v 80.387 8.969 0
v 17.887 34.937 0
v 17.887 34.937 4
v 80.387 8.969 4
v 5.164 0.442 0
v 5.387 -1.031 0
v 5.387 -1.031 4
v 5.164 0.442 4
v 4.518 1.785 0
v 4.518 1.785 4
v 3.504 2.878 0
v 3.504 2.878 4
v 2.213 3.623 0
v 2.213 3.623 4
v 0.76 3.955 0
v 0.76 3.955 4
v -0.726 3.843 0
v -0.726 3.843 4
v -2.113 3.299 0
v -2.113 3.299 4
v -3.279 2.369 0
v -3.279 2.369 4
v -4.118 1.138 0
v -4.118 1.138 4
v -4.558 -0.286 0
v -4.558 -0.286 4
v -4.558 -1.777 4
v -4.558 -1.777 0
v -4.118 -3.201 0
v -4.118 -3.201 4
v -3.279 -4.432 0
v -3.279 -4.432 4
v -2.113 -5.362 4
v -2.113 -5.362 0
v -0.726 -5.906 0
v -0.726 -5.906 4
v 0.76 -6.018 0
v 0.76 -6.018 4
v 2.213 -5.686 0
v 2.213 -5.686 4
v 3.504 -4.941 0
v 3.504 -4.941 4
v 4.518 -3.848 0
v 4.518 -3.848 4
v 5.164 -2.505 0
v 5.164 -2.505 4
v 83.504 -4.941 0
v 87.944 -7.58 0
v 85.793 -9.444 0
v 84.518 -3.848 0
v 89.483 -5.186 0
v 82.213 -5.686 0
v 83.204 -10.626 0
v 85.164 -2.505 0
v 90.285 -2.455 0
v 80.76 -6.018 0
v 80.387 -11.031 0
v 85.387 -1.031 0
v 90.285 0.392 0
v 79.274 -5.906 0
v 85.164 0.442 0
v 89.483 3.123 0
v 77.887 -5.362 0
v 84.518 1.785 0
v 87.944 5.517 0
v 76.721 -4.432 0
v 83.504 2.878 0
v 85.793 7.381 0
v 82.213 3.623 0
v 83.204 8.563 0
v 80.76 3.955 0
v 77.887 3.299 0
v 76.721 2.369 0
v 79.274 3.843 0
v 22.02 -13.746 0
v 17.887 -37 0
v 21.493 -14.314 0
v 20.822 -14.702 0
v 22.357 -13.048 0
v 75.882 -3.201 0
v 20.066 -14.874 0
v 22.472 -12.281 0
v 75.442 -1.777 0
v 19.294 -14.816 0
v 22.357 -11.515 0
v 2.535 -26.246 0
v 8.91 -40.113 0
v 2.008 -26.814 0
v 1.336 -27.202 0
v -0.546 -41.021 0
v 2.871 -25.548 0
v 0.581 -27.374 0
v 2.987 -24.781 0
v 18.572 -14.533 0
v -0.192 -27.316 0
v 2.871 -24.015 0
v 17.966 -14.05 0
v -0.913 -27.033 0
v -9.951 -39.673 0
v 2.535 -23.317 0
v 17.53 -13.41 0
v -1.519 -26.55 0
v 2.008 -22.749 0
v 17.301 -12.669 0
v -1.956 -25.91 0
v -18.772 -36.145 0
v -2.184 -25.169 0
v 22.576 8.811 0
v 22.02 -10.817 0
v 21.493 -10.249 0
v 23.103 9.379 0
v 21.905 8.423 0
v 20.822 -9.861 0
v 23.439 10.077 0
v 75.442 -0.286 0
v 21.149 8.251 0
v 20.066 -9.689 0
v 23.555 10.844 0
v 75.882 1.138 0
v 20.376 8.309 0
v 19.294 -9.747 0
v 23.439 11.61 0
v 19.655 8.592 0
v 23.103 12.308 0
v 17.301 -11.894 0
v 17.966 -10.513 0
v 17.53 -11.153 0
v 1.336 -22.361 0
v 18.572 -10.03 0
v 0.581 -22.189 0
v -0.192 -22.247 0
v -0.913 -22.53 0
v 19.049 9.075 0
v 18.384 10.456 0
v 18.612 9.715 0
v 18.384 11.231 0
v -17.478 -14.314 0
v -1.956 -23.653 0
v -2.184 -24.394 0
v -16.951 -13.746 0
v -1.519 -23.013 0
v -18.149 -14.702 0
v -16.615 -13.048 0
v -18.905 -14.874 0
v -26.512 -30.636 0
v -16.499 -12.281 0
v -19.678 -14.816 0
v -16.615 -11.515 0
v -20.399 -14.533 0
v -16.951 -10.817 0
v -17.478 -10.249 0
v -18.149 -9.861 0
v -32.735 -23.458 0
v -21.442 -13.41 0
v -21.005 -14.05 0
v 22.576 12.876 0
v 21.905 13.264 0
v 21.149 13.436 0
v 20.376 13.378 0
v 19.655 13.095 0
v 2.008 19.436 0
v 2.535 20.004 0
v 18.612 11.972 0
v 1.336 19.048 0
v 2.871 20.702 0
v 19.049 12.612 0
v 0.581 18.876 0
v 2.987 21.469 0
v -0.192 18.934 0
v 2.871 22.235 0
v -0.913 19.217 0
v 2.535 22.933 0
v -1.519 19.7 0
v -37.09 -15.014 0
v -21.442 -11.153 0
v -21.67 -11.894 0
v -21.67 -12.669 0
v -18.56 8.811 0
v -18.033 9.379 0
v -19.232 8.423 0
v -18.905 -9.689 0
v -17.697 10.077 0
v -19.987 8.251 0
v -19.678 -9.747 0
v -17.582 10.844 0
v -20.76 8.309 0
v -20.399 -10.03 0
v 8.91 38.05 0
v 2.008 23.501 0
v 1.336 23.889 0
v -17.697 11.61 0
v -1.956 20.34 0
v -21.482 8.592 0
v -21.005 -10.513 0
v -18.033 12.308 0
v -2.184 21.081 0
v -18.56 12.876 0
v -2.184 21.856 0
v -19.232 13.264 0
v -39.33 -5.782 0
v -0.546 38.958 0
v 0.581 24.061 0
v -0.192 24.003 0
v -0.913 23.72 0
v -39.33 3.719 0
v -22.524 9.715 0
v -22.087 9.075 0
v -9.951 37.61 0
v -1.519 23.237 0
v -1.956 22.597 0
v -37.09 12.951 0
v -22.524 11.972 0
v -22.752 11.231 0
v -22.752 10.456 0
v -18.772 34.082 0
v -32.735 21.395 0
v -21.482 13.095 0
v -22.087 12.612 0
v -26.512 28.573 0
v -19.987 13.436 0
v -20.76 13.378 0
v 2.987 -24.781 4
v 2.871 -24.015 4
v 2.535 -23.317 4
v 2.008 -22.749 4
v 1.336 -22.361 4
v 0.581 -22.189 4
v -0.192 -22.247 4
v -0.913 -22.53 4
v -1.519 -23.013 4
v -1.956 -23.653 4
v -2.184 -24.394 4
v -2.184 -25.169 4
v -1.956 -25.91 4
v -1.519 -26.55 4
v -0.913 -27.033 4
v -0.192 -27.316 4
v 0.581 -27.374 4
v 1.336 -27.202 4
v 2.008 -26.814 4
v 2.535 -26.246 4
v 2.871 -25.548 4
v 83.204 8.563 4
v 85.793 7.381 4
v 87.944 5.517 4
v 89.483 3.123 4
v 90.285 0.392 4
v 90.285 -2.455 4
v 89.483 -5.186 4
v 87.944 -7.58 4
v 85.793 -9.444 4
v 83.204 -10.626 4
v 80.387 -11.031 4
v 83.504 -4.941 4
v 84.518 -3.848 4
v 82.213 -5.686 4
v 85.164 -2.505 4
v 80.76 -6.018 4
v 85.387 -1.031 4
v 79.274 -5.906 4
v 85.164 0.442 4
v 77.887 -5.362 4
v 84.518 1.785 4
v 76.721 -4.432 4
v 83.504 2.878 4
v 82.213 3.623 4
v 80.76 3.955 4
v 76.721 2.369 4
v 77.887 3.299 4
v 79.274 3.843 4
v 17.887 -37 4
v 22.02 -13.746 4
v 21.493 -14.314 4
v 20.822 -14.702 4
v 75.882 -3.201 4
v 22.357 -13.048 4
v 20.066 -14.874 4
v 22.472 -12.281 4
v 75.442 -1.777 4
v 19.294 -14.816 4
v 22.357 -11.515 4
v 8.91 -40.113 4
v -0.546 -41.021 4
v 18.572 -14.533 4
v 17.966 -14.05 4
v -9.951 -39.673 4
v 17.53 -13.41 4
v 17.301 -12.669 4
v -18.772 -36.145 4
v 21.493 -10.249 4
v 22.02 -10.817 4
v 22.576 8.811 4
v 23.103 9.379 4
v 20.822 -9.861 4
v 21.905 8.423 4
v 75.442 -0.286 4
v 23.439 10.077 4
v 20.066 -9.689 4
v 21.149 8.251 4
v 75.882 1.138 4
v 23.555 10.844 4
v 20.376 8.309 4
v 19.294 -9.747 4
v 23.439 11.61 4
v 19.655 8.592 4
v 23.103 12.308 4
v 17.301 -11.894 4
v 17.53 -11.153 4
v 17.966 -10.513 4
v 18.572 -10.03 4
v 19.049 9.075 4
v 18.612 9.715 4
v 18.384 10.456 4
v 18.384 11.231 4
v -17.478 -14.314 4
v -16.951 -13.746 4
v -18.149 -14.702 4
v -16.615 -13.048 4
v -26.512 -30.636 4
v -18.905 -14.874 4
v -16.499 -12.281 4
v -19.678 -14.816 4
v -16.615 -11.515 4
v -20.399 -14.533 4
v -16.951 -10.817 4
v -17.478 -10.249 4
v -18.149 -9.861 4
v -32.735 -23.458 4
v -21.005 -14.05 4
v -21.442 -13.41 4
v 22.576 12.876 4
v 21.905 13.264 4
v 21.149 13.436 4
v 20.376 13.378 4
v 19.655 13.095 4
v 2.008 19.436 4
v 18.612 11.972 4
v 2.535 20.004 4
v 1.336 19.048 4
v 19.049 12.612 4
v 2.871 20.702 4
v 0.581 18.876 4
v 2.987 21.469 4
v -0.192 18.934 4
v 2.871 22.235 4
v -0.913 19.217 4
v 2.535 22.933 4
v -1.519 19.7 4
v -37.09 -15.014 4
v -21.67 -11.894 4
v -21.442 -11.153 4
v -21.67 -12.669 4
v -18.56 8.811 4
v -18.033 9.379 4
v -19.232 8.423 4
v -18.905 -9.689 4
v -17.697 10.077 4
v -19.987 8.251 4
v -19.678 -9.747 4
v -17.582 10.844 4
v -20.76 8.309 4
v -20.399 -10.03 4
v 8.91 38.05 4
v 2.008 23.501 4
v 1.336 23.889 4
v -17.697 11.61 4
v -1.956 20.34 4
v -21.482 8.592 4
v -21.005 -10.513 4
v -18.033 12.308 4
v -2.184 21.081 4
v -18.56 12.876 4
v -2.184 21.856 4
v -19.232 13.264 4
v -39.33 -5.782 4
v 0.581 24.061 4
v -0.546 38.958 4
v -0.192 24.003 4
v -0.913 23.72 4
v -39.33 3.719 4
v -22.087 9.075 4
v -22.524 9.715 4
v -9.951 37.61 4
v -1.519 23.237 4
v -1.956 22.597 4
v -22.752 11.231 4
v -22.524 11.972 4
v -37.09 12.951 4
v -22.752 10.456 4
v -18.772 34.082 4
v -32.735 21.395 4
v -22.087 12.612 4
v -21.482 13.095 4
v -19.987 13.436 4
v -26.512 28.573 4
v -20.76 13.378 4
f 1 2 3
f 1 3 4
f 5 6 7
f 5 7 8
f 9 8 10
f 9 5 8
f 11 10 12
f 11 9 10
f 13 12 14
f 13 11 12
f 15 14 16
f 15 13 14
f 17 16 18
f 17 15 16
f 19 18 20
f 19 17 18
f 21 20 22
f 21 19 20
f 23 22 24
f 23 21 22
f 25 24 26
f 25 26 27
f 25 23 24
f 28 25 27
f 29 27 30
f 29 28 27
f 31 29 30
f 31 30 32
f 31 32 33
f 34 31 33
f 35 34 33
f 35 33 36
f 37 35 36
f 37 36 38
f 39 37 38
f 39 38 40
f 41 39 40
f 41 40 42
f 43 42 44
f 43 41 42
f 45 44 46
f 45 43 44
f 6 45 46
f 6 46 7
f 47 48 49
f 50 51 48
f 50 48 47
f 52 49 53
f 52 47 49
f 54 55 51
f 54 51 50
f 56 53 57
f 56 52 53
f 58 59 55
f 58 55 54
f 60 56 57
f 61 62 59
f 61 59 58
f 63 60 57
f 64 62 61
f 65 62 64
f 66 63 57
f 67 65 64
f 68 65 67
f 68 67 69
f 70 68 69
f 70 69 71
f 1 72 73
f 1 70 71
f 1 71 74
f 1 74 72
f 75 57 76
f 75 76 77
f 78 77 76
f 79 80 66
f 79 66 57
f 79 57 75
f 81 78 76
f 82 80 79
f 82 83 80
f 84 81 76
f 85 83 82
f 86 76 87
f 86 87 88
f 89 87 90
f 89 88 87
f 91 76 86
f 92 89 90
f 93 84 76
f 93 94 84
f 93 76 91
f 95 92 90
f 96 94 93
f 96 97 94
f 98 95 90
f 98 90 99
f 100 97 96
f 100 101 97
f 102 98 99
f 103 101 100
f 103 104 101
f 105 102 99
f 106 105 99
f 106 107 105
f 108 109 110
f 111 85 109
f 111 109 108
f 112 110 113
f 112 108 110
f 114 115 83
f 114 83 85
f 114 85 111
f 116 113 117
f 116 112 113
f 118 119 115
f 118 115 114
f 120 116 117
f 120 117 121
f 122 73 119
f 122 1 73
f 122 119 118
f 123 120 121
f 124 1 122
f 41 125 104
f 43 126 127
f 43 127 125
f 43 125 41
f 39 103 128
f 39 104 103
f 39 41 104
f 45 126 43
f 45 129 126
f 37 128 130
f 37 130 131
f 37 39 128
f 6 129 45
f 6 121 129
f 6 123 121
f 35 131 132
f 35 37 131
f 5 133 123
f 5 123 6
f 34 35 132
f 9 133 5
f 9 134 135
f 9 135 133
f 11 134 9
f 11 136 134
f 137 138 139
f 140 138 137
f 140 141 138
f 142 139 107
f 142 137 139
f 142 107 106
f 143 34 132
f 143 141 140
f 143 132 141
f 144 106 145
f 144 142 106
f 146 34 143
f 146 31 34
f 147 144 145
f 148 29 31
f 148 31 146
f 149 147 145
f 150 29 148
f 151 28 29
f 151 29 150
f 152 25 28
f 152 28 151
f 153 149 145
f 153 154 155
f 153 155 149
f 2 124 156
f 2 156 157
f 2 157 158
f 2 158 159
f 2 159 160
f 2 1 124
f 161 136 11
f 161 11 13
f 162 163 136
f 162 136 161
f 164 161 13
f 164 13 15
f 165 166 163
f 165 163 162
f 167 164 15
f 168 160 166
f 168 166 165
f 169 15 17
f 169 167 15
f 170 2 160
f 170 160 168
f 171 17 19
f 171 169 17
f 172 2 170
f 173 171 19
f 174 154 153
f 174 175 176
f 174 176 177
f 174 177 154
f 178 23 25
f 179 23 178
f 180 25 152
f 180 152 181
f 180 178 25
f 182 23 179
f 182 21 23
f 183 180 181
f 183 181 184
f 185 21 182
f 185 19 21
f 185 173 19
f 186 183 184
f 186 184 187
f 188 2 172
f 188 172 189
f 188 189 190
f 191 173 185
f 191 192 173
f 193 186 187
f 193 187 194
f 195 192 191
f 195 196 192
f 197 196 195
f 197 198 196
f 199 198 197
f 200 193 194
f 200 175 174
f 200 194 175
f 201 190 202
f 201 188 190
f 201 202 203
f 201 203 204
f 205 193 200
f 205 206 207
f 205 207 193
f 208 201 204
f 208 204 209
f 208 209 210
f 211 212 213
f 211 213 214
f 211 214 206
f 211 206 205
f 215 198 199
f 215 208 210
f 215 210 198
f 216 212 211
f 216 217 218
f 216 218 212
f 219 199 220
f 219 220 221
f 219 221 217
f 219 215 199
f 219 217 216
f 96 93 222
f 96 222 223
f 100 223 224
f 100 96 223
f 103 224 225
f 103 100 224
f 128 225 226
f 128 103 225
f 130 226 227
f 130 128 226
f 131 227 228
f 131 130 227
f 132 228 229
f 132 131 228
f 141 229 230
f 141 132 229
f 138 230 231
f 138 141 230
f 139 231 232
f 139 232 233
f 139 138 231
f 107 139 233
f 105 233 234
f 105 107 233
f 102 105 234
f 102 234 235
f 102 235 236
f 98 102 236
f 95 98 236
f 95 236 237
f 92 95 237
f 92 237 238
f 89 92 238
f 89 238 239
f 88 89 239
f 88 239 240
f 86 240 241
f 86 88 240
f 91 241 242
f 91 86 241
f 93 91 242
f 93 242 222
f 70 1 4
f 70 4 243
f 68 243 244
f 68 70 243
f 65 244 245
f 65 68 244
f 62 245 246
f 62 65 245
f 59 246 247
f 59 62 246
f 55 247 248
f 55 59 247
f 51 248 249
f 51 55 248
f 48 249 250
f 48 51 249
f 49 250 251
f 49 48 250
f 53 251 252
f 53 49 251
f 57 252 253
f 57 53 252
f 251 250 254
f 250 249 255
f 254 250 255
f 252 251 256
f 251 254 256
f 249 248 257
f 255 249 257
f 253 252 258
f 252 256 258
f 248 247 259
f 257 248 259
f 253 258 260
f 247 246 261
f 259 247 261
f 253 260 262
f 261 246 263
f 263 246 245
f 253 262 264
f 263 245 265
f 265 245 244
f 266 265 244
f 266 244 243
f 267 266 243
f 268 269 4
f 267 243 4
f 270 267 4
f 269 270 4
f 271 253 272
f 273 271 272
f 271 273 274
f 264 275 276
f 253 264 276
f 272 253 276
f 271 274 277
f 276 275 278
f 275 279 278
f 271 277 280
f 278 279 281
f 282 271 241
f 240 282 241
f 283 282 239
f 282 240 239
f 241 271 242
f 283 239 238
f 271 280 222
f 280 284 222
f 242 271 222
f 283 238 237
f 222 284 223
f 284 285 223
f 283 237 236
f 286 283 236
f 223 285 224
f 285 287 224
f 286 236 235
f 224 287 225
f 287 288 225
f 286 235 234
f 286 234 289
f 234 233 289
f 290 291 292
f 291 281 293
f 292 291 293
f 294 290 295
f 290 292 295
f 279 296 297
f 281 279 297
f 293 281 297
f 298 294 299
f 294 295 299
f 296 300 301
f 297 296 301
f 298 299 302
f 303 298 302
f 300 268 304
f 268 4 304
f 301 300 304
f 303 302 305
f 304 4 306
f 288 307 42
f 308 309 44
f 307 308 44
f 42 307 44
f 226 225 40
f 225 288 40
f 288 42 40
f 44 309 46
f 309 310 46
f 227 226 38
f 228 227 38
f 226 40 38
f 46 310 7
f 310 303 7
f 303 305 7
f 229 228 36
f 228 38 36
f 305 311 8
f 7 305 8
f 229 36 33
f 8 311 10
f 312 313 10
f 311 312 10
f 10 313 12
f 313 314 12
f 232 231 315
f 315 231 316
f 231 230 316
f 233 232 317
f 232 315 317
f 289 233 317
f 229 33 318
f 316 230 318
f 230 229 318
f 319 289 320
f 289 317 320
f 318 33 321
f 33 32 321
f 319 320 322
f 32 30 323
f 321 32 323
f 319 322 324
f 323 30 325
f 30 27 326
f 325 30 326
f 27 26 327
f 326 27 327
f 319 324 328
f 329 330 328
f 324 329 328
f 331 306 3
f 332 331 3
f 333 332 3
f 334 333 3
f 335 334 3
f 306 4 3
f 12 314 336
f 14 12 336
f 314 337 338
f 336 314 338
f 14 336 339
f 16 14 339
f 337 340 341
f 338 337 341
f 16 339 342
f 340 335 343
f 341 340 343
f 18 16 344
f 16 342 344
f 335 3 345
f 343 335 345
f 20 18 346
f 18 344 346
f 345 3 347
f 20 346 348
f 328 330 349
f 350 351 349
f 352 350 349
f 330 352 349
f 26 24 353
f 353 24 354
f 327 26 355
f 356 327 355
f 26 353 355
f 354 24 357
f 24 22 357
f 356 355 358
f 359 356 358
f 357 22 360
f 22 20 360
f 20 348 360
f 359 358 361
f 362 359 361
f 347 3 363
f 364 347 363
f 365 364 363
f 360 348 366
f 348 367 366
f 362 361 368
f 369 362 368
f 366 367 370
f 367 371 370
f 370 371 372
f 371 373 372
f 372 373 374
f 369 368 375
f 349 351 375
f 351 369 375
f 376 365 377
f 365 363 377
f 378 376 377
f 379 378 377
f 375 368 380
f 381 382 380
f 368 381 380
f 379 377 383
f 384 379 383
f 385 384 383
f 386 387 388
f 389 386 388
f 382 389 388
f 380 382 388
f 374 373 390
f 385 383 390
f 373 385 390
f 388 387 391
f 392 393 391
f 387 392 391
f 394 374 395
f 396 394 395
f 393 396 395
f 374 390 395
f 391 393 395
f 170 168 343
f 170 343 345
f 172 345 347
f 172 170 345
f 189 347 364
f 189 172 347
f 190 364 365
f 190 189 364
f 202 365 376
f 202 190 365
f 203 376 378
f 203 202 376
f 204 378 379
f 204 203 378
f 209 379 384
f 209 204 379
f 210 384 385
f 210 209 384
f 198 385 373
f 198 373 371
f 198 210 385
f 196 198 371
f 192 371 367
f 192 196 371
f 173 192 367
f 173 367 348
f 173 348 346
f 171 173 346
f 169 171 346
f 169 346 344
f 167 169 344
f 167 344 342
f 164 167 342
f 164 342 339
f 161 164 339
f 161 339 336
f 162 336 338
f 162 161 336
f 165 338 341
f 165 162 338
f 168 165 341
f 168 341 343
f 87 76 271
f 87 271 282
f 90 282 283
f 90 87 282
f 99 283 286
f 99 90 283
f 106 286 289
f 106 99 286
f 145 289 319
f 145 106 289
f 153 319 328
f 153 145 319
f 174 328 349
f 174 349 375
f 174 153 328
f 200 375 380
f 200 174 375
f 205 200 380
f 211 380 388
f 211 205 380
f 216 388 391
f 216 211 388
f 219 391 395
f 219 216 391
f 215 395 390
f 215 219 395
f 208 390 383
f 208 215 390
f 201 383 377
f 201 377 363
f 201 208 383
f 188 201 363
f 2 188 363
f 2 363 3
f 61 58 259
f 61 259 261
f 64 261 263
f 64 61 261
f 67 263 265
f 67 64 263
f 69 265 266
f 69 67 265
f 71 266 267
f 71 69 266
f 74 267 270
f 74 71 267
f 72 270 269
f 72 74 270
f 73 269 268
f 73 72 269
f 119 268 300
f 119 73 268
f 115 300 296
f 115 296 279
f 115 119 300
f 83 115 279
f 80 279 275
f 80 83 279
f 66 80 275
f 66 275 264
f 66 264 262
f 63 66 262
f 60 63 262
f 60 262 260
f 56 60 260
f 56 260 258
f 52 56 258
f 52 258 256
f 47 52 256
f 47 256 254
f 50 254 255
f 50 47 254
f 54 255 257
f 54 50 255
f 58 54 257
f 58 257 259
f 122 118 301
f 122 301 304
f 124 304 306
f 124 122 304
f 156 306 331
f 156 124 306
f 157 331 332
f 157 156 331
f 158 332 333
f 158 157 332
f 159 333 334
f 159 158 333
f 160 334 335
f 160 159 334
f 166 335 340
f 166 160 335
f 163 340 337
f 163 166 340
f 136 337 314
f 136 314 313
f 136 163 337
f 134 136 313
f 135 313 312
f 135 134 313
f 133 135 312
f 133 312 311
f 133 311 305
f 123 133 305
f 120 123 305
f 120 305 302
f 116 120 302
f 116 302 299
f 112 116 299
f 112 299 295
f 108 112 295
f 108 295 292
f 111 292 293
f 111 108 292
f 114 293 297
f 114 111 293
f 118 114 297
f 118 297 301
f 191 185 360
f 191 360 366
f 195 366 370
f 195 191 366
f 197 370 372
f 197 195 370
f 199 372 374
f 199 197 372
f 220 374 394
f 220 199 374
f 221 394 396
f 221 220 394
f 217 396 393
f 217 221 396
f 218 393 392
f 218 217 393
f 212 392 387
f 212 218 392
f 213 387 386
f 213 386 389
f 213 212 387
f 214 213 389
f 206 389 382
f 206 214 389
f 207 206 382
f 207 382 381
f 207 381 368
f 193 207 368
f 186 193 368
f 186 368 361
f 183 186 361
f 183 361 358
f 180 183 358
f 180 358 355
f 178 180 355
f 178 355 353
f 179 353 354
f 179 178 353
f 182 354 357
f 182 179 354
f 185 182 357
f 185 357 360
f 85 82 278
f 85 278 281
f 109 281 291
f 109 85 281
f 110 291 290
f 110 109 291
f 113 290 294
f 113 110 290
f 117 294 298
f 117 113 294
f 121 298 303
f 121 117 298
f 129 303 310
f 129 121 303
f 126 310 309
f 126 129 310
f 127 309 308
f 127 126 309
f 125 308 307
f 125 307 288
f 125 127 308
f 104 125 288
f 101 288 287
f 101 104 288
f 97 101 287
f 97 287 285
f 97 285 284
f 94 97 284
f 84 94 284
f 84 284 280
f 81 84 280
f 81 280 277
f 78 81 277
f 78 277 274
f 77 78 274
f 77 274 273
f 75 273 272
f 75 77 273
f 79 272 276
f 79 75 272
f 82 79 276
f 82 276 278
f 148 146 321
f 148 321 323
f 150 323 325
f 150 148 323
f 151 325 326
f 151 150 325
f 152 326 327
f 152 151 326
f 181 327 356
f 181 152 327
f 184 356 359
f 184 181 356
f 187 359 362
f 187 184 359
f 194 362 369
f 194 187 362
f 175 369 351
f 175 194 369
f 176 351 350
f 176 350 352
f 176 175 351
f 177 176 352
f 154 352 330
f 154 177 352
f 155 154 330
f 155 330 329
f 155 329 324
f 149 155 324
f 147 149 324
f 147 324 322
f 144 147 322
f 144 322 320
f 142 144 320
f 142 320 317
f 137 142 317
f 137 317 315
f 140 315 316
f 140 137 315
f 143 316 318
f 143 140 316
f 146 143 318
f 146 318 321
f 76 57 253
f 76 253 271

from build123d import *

# Parameters (mm, degrees)
SKETCH_2_R      = 2.6
SKETCH_2_R_2    = 5
EXTRUDE_1_DEPTH = 4


with BuildPart() as part:
    # 草图2 → 凸台-拉伸1 (new body)
    with BuildSketch(Plane.XY):
        with BuildLine():
            Line((17.886574367, 34.937240644), (80.386574367, 8.968504219))
            ThreePointArc((80.386574367, 8.968504219), (90.386574367, -1.031495781), (80.386574367, -11.031495781))
            Line((80.386574367, -11.031495781), (17.886574367, -37.000232206))
            ThreePointArc((17.886574367, -37.000232206), (-39.613425633, -1.031495781), (17.886574367, 34.937240644))
        make_face()
        with Locations((0.386574367, -24.781495781)):
            Circle(SKETCH_2_R, mode=Mode.SUBTRACT)
        with Locations((19.872145952, -12.281495781)):
            Circle(SKETCH_2_R, mode=Mode.SUBTRACT)
        with Locations((0.386574367, -1.031495781)):
            Circle(SKETCH_2_R_2, mode=Mode.SUBTRACT)
        with Locations((-20.181528973, 10.843504219)):
            Circle(SKETCH_2_R, mode=Mode.SUBTRACT)
        with Locations((20.954677707, 10.843504219)):
            Circle(SKETCH_2_R, mode=Mode.SUBTRACT)
        with Locations((-19.098997218, -12.281495781)):
            Circle(SKETCH_2_R, mode=Mode.SUBTRACT)
        with Locations((0.386574367, 21.468504219)):
            Circle(SKETCH_2_R, mode=Mode.SUBTRACT)
        with Locations((80.386574367, -1.031495781)):
            Circle(SKETCH_2_R_2, mode=Mode.SUBTRACT)
    extrude(amount=EXTRUDE_1_DEPTH)


solid = part.part
